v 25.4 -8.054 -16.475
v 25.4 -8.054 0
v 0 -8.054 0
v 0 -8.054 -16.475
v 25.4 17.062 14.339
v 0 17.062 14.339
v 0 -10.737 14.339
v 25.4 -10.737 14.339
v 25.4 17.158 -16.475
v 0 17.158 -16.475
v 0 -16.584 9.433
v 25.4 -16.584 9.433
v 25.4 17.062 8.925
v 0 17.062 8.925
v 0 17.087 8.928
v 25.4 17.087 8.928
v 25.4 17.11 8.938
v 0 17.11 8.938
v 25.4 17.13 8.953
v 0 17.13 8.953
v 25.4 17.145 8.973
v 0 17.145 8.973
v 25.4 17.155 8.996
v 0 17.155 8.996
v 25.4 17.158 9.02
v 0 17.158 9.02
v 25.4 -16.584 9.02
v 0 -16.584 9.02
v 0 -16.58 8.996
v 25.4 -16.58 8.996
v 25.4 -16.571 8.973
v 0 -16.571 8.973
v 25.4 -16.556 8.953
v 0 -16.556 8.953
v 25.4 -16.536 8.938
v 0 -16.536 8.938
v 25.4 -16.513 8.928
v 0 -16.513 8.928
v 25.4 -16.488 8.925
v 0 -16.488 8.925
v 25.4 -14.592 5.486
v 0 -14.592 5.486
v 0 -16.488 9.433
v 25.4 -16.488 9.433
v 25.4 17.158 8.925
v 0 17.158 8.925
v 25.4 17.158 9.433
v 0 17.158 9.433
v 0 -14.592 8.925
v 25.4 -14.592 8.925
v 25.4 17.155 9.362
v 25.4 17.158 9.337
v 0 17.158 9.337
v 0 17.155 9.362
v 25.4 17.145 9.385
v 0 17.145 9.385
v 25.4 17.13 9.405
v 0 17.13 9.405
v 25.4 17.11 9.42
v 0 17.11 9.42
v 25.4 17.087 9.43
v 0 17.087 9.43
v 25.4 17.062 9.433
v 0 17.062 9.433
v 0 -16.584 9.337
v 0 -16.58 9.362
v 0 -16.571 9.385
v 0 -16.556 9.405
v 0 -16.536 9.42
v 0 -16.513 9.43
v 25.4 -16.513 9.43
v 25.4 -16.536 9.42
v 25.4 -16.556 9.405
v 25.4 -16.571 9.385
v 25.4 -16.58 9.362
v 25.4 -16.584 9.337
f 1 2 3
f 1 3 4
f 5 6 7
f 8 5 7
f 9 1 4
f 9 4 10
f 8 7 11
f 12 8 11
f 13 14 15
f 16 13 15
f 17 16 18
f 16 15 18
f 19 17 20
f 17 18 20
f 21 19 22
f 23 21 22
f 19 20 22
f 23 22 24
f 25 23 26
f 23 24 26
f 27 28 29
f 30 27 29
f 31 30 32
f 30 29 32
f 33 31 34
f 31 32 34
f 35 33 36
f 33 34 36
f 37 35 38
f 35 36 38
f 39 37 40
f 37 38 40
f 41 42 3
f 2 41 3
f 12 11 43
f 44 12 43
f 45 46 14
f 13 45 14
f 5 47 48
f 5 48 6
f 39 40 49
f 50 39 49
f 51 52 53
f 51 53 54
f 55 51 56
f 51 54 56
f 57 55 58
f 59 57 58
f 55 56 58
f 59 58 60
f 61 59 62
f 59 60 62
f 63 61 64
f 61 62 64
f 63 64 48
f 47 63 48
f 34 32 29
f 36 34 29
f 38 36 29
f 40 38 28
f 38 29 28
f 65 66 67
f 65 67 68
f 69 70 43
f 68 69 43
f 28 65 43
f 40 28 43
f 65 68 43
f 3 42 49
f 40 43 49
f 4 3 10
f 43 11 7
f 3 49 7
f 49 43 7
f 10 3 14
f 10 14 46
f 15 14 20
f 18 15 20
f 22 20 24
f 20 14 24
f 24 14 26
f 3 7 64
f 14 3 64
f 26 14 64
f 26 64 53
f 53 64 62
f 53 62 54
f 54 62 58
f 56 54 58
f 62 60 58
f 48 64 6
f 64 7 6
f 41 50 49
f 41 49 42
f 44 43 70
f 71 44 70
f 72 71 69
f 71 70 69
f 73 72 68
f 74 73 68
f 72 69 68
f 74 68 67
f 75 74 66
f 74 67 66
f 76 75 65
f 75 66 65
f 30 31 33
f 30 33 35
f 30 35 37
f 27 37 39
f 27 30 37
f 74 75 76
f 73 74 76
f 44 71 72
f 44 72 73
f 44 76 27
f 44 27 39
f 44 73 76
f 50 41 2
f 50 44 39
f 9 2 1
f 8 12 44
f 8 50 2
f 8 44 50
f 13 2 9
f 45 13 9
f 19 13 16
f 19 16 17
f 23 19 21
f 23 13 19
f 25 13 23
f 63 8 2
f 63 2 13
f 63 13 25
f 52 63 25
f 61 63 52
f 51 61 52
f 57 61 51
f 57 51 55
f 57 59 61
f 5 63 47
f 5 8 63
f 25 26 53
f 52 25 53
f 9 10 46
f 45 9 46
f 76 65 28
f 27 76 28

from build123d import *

# Parameters (mm, degrees)
F1_DEPTH = 25.4
F2_DEPTH = 25.4
F3_DEPTH = 25.4


with BuildPart() as f1:
    # F0 (on Right) → F1 (new body)
    with BuildSketch(Plane.YZ):
        Polygon((-16.583575, 9.432823), (-16.488011, 9.432823), (17.062246, 9.432823), (17.15781, 9.432823), (17.062246, 14.338518), (-10.737195, 14.338518), align=None)
    extrude(amount=F1_DEPTH)

    # F0 (on Right) → F2 (join)
    with BuildSketch(Plane.YZ):
        with BuildLine():
            Line((-16.488011, 8.924823), (-14.59219, 8.924823))
            Line((-14.59219, 8.924823), (17.062246, 8.924823))
            ThreePointArc((17.062246, 8.924823), (17.12982, 8.952814), (17.15781, 9.020388))
            Line((17.15781, 9.020388), (17.15781, 9.337259))
            ThreePointArc((17.15781, 9.337259), (17.12982, 9.404833), (17.062246, 9.432823))
            Line((17.062246, 9.432823), (-16.488011, 9.432823))
            ThreePointArc((-16.488011, 9.432823), (-16.555585, 9.404833), (-16.583575, 9.337259))
            Line((-16.583575, 9.337259), (-16.583575, 9.020388))
            ThreePointArc((-16.583575, 9.020388), (-16.555585, 8.952814), (-16.488011, 8.924823))
        make_face()
    extrude(amount=F2_DEPTH)

    # F0 (on Right) → F3 (join)
    with BuildSketch(Plane.YZ):
        Polygon((17.062246, 8.924823), (-14.59219, 8.924823), (-14.59219, 5.485807), (-8.05446, 0), (-8.05446, -16.475177), (17.15781, -16.475177), (17.15781, 8.924823), align=None)
    extrude(amount=F3_DEPTH)


solid = f1.part
